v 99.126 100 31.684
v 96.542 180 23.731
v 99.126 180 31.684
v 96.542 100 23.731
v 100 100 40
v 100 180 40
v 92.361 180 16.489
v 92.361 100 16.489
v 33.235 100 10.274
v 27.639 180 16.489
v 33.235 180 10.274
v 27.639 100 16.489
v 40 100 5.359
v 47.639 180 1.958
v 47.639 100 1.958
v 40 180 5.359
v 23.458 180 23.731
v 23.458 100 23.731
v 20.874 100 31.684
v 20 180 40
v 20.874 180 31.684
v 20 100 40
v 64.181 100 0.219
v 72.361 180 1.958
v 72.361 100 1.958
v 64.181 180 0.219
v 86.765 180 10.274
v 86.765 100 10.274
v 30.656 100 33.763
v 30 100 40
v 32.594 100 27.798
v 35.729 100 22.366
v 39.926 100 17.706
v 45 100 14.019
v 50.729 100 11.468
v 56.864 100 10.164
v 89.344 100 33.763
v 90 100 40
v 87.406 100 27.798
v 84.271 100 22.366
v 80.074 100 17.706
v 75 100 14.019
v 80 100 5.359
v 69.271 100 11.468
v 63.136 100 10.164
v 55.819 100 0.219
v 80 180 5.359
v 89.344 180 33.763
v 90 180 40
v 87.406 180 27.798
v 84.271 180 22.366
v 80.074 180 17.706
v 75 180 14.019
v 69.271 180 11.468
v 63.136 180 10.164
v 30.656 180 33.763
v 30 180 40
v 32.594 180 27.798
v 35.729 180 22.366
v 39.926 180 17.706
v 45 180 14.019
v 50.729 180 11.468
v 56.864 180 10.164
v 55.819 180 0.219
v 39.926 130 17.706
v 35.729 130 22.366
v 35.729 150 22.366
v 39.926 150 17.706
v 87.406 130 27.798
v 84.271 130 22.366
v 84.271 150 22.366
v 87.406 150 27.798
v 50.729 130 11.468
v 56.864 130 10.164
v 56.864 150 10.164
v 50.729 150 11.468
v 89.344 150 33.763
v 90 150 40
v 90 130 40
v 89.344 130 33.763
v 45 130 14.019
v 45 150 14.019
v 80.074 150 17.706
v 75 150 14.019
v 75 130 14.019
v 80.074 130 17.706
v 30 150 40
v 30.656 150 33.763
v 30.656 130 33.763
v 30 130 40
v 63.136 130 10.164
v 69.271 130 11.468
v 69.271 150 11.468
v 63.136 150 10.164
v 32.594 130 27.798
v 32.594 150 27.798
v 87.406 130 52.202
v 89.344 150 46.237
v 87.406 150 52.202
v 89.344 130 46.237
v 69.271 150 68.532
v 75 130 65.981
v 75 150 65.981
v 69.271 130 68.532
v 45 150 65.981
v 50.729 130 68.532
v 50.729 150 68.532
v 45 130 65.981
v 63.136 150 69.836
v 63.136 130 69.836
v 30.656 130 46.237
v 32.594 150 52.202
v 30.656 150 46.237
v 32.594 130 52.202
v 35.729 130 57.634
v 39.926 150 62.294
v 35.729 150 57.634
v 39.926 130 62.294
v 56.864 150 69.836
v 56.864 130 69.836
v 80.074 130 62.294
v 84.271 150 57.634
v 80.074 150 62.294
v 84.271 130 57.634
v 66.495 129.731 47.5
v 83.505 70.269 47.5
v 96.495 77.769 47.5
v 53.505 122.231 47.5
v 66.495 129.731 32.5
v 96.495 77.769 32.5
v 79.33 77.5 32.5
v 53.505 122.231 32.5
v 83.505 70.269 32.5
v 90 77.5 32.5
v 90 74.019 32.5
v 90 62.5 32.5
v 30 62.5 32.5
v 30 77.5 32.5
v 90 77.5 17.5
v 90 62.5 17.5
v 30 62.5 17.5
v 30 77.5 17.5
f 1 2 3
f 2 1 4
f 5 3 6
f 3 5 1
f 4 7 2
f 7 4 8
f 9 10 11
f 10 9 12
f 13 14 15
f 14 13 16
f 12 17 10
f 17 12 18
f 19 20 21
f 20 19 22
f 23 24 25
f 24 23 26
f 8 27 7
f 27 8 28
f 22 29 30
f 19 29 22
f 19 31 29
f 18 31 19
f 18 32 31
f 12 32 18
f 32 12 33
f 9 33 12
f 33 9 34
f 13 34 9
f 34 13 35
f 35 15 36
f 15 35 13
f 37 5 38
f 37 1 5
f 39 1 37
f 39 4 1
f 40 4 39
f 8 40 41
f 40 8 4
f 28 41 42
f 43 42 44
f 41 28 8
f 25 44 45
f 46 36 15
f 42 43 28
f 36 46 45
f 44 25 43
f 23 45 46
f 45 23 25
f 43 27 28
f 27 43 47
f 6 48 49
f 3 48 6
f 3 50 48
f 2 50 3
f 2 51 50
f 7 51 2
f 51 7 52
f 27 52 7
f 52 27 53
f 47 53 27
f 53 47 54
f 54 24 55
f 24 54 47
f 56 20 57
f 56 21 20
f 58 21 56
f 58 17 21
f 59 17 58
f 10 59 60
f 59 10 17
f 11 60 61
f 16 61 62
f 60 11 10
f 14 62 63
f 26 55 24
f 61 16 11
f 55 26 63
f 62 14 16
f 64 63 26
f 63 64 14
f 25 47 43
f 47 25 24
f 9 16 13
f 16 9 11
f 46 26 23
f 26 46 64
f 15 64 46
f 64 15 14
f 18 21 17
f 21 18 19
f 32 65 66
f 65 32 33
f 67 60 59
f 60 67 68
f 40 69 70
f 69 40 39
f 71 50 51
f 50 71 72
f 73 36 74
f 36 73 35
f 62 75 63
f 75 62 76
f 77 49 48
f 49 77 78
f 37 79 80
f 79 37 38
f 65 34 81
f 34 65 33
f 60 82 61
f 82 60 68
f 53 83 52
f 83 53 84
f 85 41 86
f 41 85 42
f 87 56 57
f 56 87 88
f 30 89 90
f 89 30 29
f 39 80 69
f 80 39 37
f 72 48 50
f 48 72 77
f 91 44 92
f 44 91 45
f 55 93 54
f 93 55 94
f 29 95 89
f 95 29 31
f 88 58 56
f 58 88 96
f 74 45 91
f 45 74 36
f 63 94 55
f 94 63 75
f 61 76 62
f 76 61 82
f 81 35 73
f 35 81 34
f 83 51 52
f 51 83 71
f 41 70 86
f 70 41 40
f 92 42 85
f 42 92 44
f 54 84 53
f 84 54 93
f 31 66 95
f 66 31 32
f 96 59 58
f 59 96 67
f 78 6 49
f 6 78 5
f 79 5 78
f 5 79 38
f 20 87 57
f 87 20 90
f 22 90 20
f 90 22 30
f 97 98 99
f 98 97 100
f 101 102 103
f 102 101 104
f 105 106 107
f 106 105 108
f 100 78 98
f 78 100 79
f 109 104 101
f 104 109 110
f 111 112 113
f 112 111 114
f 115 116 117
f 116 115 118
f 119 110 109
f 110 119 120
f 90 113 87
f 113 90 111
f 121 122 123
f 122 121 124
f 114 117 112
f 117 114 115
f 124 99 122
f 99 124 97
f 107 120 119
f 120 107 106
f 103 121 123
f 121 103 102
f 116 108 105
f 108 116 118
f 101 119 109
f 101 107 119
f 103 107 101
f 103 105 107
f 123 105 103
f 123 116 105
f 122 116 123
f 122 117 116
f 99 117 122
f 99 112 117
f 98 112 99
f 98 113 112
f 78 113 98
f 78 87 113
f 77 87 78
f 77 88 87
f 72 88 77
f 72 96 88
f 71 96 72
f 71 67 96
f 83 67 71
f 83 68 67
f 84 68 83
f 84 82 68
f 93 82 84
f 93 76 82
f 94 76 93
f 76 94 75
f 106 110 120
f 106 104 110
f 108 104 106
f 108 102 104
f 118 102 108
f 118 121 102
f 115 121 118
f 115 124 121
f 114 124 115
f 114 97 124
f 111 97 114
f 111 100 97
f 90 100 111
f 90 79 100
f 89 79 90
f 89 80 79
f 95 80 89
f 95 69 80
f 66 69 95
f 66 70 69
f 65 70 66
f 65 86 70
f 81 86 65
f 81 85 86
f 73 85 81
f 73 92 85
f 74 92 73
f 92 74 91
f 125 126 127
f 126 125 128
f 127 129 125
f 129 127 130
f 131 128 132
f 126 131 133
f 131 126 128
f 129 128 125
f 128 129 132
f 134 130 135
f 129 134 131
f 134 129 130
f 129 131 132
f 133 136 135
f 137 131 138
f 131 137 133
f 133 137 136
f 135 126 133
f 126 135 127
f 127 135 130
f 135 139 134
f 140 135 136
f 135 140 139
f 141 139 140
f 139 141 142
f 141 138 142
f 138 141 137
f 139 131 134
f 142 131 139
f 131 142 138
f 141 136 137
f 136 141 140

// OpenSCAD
//rotation timing
strokes= 4;
angletillcombust= (strokes/2)*180;

//bore displacement
displacement=20;
bore = 60;
//cylinder
chamber_height= 80;
chamber_walls=20;
chamber_diameter= bore+chamber_walls;
chamber_center= (bore+chamber_walls)/2;
//pistons
piston_head= 20;
piston_oscillation= chamber_height-piston_head;
//rods
rod_thickness= bore/4;
translate([20,100,0]){
//chamber
difference(){
translate([chamber_center,0,chamber_center]){
rotate([-90,0,0]){
cylinder(chamber_height, d=chamber_diameter);
}
}
//bore cutout
translate([chamber_center,0,chamber_center]){
rotate([-90,0,0]){
cylinder(chamber_height, d=bore);
}
}
//cross-section chamber
    translate([0,0,chamber_center]){
        cube([chamber_diameter,chamber_height,chamber_diameter/2]);
        }
}

//pistonhead
translate([chamber_center,piston_oscillation/2*sin(-360*$t)+chamber_height/2-piston_head/2,chamber_center]){
rotate([-90,0,0]){
cylinder(piston_head,d=bore);
}
}
//rod
//rotate([0,180,180]){
//rotate([0,0,-20*sin(-180*$t)]){
//12.5*sin($t*-360)+
translate([bore/4*cos($t*-360)+chamber_center,piston_oscillation/2*sin(-360*$t),chamber_center]){

    rotate([0,0,0]){
    rotate([0,0,bore/2*cos(-360*$t)]){
cube([rod_thickness,piston_oscillation,rod_thickness],center=true);
//}
}
}
}
translate([chamber_center,-piston_oscillation/2,chamber_center-rod_thickness]){
rotate([0,0,-360*$t]){
cube([piston_oscillation,rod_thickness,rod_thickness],center=true);
}
}
//curly for whole engine
}
